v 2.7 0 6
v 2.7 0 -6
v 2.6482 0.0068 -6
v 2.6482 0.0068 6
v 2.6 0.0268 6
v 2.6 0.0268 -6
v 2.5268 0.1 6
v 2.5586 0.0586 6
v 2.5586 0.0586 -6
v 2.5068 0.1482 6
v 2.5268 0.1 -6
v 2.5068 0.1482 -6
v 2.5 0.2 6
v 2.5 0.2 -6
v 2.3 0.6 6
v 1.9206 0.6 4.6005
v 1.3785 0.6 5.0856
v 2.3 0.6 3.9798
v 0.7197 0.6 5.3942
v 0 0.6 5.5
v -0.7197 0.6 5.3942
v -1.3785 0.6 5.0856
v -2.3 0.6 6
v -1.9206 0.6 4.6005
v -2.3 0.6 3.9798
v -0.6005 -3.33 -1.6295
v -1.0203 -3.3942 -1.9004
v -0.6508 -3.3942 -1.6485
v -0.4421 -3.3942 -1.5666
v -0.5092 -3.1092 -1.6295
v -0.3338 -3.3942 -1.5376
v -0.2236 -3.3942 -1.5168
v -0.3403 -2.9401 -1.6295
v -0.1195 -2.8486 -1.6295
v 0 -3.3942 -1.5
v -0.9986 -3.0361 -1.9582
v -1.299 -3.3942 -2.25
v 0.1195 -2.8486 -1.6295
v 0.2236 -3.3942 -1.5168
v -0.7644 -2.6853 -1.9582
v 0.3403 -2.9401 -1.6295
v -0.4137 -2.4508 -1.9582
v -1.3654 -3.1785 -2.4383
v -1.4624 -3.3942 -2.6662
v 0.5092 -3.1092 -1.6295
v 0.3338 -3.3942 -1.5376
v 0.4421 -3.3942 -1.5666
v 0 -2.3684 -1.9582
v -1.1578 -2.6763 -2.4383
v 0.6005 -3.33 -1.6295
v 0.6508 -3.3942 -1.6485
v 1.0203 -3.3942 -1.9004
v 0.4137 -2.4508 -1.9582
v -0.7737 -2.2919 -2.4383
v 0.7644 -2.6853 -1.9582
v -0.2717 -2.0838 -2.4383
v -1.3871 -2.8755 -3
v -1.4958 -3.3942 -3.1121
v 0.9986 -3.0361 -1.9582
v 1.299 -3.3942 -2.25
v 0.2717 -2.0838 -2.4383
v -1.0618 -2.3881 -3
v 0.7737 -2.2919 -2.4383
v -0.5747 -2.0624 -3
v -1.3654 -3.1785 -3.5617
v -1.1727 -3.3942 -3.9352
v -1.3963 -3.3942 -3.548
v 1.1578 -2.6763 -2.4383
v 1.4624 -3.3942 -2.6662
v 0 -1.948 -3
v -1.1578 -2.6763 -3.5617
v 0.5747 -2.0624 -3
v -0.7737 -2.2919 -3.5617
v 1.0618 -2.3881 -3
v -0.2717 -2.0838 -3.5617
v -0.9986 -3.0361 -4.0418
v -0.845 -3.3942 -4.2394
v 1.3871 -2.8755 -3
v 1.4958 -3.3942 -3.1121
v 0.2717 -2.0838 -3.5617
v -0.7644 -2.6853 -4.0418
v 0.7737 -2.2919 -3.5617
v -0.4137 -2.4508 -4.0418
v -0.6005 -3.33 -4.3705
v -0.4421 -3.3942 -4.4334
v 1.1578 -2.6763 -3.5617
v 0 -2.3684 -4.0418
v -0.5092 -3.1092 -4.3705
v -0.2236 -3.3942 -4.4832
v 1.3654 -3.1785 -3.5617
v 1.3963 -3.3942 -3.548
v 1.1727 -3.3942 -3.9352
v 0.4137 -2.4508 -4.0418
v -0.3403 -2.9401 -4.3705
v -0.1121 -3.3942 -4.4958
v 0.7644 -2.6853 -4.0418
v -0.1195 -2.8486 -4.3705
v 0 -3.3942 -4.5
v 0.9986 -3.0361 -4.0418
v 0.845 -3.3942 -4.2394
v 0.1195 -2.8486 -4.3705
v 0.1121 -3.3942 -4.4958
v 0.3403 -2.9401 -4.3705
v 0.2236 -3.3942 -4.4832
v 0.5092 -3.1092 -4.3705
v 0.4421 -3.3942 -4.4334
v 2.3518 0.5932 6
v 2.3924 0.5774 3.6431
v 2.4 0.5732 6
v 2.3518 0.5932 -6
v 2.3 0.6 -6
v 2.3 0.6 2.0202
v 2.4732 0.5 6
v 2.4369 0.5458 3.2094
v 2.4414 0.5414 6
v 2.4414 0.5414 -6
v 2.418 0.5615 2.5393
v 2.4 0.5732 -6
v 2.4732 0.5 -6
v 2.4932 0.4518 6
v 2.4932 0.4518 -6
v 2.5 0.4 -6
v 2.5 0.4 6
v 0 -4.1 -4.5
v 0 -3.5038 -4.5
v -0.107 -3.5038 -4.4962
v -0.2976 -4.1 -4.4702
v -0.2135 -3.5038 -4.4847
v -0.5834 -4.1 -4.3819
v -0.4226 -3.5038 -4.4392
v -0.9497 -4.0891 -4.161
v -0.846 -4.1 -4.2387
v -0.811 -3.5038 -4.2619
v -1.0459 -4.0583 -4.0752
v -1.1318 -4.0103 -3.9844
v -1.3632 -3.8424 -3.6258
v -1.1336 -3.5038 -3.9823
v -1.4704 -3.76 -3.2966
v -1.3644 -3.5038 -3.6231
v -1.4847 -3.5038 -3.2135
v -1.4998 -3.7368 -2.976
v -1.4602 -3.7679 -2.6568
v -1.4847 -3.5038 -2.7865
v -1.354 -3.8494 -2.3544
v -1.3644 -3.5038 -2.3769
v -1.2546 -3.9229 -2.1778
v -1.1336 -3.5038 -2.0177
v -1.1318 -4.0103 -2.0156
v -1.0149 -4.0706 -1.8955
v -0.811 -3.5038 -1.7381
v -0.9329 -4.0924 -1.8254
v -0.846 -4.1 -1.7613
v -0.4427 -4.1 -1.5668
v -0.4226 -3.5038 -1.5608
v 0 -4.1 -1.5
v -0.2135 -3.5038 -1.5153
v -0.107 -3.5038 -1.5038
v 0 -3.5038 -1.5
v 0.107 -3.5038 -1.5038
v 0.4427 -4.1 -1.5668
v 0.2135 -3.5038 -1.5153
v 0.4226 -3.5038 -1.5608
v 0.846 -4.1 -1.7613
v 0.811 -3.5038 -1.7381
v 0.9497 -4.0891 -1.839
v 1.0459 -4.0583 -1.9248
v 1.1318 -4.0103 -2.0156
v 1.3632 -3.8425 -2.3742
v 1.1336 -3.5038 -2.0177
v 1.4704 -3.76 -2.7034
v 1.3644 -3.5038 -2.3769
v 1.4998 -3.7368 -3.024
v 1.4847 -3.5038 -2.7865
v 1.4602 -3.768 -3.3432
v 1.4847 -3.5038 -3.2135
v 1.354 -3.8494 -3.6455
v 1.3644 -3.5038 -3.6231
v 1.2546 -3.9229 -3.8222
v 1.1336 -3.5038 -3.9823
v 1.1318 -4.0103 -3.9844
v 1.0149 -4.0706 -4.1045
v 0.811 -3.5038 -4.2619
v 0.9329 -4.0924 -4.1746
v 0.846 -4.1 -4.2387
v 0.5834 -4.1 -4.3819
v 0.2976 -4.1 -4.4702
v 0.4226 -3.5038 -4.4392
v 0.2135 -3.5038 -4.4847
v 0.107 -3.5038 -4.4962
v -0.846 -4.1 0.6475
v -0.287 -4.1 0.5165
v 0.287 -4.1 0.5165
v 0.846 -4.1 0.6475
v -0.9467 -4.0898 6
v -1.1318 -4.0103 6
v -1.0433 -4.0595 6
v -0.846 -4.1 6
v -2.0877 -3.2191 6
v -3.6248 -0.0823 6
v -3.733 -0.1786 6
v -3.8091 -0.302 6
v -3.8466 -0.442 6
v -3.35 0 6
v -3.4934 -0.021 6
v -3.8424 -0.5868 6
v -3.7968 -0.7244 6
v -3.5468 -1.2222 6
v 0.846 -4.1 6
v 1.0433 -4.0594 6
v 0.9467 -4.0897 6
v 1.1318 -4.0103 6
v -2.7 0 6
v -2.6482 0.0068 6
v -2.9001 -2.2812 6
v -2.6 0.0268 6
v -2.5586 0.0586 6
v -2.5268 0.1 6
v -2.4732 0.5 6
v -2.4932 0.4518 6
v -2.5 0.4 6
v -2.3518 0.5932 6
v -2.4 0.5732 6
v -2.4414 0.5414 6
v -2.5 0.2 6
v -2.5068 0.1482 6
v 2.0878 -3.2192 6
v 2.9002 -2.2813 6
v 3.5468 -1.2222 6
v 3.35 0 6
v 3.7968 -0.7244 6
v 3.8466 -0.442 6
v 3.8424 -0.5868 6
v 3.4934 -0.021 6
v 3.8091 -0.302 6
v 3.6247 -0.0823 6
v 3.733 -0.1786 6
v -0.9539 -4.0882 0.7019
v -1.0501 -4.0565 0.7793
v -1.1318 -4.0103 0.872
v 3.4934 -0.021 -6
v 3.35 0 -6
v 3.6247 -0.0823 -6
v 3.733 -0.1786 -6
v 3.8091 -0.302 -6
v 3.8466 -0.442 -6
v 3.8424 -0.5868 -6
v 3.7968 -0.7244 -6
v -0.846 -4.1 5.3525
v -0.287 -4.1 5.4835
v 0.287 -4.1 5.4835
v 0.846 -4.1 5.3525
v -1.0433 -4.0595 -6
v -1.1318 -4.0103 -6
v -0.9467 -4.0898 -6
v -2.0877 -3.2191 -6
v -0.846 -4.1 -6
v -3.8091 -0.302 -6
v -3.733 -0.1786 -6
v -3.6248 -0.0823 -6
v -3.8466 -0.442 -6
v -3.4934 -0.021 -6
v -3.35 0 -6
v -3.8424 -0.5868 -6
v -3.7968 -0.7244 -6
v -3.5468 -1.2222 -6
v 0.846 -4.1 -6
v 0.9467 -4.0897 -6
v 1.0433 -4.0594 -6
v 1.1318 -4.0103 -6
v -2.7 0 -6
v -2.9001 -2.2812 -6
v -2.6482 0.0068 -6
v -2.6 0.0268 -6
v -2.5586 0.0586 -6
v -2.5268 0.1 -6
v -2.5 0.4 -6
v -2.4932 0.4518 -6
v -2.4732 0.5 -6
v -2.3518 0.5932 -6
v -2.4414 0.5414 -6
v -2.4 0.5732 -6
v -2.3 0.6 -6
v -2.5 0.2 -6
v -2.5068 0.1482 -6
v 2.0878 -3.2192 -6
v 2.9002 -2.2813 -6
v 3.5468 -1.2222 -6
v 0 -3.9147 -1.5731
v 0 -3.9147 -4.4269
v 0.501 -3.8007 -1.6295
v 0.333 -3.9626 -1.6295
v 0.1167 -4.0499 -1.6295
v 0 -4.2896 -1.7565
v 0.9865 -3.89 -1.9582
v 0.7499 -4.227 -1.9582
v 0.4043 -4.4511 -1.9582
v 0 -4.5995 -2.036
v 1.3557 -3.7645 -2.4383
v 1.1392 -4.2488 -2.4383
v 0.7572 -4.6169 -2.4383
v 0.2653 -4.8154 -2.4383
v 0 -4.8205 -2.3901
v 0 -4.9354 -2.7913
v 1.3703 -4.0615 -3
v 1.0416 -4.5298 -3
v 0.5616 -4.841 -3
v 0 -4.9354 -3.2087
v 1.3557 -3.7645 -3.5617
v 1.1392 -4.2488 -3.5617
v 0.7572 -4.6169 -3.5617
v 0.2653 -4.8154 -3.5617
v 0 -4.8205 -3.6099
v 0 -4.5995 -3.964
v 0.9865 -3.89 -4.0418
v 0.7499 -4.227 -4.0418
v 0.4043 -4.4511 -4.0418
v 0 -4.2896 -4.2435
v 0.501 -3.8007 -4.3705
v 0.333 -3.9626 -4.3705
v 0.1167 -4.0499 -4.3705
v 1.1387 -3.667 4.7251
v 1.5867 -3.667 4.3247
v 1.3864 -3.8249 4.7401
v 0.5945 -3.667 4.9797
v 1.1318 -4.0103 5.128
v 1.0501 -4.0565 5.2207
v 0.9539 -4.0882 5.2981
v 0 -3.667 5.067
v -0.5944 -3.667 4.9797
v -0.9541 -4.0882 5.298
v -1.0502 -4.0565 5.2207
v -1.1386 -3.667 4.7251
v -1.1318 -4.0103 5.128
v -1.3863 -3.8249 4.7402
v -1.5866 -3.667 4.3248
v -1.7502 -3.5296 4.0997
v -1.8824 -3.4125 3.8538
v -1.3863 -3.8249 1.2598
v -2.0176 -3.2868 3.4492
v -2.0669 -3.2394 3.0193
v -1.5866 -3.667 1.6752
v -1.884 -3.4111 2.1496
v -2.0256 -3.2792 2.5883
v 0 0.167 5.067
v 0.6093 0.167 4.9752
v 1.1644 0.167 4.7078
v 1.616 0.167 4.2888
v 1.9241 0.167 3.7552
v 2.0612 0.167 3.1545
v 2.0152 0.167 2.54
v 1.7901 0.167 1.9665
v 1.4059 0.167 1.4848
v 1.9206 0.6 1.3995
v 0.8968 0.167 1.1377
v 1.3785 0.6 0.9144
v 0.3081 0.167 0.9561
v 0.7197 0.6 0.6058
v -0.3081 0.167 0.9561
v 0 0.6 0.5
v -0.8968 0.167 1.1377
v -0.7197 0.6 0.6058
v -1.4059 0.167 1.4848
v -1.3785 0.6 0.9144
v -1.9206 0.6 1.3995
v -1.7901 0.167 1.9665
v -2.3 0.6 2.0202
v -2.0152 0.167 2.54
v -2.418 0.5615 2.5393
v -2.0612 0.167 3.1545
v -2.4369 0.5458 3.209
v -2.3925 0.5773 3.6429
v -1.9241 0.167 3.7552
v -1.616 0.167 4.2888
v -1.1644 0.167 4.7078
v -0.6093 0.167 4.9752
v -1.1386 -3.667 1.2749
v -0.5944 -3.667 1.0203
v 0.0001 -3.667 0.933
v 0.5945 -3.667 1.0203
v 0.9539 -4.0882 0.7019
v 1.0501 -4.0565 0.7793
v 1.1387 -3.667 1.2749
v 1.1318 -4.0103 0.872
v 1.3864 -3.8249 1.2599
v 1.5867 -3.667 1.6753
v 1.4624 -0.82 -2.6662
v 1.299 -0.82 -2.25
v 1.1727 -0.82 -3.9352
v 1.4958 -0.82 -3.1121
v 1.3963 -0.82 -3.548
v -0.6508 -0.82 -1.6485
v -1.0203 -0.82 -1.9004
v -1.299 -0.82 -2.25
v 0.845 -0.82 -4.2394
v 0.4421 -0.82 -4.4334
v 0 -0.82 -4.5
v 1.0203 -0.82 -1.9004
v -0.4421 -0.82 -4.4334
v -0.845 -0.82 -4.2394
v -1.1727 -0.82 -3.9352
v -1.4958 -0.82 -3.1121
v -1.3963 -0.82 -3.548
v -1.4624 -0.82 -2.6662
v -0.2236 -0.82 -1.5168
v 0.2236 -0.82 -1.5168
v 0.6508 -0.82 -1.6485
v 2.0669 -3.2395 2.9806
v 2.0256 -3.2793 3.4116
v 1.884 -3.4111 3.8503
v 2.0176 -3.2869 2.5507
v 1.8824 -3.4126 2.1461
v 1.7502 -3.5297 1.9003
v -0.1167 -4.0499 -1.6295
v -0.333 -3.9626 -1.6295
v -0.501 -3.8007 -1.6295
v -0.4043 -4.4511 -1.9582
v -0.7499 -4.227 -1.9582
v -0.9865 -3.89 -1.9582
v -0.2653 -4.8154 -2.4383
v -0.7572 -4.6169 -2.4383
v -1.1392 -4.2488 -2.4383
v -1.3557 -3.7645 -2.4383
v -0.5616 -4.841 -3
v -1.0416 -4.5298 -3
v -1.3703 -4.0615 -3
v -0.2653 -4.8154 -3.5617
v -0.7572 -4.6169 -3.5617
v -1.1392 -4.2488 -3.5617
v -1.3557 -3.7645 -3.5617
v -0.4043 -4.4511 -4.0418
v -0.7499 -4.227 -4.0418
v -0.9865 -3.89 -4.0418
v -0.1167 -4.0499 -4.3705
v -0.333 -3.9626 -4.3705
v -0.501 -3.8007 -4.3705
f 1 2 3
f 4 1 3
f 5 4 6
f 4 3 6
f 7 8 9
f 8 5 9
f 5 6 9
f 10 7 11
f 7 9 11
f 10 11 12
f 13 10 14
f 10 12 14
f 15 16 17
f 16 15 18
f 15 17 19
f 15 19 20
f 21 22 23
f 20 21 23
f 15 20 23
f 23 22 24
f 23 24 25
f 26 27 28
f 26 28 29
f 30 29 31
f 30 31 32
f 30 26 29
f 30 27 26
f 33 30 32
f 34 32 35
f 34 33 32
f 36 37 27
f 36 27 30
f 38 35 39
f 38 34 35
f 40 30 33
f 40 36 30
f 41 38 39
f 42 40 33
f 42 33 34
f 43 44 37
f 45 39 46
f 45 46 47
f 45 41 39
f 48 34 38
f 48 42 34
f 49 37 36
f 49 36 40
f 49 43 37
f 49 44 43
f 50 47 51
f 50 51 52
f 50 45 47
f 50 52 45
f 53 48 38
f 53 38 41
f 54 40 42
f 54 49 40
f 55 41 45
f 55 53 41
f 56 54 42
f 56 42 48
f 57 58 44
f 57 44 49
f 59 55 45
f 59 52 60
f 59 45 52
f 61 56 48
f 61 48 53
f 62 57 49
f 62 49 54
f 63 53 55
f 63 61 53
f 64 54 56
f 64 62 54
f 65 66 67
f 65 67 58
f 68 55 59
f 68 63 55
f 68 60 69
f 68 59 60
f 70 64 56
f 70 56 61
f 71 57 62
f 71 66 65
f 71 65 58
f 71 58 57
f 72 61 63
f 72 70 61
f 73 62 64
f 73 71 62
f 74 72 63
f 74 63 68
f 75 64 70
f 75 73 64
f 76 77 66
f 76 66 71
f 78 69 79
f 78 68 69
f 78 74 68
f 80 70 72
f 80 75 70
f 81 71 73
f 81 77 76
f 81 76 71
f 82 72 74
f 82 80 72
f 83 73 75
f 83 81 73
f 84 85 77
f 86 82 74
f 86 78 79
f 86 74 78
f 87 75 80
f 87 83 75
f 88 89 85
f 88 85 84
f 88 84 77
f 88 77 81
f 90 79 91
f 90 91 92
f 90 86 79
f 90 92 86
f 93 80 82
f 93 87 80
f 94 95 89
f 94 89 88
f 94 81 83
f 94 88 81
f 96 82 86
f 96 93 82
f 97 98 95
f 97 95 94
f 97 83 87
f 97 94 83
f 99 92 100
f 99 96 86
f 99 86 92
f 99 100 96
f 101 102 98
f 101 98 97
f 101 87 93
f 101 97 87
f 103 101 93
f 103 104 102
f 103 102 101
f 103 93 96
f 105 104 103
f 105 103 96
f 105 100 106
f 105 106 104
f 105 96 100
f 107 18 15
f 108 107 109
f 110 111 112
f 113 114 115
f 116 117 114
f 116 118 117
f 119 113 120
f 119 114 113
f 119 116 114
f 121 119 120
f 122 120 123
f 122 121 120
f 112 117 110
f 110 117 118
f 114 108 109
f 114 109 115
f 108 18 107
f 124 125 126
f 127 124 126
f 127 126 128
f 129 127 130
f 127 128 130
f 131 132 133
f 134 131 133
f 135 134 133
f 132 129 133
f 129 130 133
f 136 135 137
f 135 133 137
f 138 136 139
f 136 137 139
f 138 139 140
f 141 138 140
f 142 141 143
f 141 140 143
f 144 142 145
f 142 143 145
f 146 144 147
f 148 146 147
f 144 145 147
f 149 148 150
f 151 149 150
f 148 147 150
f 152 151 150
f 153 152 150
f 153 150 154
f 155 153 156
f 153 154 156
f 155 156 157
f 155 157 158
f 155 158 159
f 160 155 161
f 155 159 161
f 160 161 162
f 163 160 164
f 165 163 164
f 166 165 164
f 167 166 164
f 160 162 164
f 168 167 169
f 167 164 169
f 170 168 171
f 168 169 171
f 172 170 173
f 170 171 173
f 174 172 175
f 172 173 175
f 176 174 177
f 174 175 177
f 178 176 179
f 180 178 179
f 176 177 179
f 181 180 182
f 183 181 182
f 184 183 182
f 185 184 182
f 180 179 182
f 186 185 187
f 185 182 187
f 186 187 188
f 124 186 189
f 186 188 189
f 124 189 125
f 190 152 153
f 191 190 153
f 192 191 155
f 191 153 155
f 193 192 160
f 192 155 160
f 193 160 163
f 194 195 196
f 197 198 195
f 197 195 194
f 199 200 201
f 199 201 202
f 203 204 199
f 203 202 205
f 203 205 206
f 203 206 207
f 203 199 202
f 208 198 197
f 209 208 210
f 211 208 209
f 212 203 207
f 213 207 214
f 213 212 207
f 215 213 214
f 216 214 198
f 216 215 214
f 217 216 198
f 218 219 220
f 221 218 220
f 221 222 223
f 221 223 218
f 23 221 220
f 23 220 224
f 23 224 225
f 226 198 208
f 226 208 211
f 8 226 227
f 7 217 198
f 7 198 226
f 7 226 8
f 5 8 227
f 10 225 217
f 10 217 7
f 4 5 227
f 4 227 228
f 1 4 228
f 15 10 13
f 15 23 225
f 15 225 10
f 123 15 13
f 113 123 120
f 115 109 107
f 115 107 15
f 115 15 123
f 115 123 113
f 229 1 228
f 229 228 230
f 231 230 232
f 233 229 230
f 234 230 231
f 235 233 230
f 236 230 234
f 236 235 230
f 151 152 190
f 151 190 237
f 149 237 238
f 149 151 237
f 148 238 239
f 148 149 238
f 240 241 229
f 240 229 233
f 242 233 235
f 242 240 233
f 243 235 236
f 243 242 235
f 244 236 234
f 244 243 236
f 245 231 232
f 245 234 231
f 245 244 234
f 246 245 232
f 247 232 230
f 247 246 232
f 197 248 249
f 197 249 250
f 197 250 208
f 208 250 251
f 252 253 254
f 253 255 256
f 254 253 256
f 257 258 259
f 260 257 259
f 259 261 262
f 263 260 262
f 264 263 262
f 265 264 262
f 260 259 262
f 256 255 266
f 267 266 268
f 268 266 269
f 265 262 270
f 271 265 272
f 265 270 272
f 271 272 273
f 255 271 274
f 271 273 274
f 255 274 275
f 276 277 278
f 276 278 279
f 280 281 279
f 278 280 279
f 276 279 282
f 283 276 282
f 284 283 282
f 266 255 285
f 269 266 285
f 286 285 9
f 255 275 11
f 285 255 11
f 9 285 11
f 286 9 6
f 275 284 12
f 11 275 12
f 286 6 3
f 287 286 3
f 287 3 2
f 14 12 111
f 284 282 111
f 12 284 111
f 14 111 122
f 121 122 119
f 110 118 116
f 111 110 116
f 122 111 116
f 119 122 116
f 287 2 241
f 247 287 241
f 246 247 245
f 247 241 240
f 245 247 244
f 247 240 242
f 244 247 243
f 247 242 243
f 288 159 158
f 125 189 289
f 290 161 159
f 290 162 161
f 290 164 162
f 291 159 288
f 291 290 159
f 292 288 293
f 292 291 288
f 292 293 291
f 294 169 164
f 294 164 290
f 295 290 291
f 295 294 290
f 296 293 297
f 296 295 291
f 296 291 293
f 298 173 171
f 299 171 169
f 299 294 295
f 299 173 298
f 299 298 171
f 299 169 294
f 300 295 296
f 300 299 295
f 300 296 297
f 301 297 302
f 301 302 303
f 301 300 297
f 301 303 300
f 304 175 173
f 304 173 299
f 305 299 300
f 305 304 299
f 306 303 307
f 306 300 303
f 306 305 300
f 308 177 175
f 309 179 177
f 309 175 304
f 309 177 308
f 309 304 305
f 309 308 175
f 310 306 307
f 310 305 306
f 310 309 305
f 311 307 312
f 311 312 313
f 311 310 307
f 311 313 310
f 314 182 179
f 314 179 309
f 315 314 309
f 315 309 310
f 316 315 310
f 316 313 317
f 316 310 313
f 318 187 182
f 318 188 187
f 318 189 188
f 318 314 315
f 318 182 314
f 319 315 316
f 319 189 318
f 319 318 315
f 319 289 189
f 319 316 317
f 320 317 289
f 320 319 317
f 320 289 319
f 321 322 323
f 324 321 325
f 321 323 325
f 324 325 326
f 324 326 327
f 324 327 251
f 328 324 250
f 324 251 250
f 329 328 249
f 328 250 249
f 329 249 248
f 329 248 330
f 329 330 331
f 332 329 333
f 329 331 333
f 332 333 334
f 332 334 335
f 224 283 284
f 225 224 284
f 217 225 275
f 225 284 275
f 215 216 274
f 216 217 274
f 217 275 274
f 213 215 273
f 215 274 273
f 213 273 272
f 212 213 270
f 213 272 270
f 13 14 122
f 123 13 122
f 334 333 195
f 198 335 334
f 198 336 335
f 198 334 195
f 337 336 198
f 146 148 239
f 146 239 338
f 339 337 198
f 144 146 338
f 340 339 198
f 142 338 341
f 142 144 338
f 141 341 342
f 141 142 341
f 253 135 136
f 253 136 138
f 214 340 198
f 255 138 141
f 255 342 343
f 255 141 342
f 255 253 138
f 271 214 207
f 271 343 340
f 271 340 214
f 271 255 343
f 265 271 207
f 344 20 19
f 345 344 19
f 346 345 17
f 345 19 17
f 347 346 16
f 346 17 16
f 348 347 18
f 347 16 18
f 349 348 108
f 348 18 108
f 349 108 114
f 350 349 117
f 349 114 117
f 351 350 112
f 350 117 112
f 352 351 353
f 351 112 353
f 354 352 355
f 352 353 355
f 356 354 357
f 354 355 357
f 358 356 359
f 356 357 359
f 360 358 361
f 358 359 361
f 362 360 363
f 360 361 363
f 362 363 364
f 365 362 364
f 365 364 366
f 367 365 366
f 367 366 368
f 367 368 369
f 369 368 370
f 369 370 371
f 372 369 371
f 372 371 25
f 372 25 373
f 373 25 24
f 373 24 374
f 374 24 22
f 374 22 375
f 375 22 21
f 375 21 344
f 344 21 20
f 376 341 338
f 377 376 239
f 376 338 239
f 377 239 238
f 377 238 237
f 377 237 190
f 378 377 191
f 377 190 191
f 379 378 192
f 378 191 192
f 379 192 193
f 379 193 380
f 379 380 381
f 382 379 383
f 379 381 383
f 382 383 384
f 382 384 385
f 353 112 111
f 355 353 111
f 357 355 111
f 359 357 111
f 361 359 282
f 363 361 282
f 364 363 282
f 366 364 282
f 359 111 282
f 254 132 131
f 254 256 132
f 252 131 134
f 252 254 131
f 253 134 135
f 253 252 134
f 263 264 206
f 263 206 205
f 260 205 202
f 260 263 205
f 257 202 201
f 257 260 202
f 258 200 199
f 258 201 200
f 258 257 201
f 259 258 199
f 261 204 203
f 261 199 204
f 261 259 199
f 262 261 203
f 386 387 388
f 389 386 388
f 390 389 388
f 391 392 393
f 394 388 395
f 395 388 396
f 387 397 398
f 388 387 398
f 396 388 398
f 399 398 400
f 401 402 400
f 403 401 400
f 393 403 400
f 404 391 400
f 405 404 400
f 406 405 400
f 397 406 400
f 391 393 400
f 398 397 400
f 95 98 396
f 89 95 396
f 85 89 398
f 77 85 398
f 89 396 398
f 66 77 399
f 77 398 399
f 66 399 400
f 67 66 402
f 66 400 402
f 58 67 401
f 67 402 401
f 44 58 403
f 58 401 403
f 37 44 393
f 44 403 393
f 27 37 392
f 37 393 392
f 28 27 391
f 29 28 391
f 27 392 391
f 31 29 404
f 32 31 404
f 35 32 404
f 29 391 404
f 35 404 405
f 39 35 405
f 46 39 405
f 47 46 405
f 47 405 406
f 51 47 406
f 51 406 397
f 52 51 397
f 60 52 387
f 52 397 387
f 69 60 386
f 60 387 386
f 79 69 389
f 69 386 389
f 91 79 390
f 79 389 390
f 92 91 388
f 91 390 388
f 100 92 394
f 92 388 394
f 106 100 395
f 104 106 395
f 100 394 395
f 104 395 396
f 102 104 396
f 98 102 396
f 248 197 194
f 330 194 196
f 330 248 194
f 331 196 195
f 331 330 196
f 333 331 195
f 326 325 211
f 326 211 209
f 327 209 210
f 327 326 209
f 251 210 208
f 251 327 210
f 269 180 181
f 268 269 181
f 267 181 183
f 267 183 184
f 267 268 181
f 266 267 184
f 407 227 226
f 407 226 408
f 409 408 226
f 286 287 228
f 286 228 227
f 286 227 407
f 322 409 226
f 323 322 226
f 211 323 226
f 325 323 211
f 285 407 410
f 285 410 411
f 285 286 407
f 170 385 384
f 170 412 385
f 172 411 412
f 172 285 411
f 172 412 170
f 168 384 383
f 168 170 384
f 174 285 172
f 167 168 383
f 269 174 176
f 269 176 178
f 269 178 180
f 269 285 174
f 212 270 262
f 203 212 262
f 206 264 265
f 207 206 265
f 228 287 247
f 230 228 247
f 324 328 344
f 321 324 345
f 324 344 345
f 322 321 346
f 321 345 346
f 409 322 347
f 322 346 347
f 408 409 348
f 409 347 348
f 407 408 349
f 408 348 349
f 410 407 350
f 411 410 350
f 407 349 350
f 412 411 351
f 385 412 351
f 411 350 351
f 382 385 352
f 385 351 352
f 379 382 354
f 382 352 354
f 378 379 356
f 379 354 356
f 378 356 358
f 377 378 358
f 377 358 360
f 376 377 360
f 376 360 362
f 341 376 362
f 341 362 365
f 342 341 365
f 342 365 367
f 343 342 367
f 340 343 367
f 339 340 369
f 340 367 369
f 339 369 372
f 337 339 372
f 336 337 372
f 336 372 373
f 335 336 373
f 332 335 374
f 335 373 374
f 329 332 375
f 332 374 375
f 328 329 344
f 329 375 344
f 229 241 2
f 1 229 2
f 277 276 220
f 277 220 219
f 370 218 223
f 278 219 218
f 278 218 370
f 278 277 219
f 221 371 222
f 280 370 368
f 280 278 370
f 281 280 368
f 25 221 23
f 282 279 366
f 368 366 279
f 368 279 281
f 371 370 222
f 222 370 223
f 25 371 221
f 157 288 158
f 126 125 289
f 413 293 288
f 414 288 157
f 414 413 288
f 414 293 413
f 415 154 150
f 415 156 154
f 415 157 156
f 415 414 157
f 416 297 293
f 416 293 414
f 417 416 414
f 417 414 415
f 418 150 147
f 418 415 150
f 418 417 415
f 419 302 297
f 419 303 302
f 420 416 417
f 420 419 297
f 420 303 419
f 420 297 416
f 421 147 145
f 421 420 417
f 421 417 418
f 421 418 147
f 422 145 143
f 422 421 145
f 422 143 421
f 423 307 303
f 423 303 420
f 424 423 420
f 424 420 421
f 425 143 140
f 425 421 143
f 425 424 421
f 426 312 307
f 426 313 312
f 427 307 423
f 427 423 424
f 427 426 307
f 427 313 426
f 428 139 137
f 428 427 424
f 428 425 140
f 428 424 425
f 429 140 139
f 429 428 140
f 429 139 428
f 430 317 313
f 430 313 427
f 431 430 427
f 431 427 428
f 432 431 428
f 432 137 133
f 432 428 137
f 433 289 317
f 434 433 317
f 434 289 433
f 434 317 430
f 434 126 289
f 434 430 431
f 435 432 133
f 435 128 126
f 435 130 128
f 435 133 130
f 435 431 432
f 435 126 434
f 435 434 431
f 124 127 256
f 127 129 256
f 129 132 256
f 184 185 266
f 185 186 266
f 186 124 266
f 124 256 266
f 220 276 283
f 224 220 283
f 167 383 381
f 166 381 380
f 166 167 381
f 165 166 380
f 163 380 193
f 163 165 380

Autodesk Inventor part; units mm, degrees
sketch "Sketch_1" plane through (0, 0, 0) normal (0, 0, 1) x (1, 0, 0)
  arc A0 (-3.35, 0) -> (-3.7968, -0.7244) centre (-3.35, -0.5) ccw
  line L0 (-3.7968, -0.7244) -> (-3.5468, -1.2222)
  arc A1 (-3.5468, -1.2222) -> (-1.1318, -4.0103) centre (3.1555, 2.1435) ccw
  arc A2 (-1.1318, -4.0103) -> (-0.846, -4.1) centre (-0.846, -3.6) ccw
  line L1 (-0.846, -4.1) -> (0.846, -4.1)
  arc A3 (0.846, -4.1) -> (1.1318, -4.0103) centre (0.846, -3.6) ccw
  arc A4 (1.1318, -4.0103) -> (3.5468, -1.2222) centre (-3.1555, 2.1435) ccw
  line L2 (3.5468, -1.2222) -> (3.7968, -0.7244)
  arc A5 (3.7968, -0.7244) -> (3.35, 0) centre (3.35, -0.5) ccw
  line L3 (3.35, 0) -> (2.7, 0)
  arc A6 (2.5, 0.2) -> (2.7, 0) centre (2.7, 0.2) ccw
  line L4 (2.5, 0.2) -> (2.5, 0.4)
  arc A7 (2.5, 0.4) -> (2.3, 0.6) centre (2.3, 0.4) ccw
  line L5 (2.3, 0.6) -> (-2.3, 0.6)
  arc A8 (-2.3, 0.6) -> (-2.5, 0.4) centre (-2.3, 0.4) ccw
  line L6 (-2.5, 0.4) -> (-2.5, 0.2)
  arc A9 (-2.7, 0) -> (-2.5, 0.2) centre (-2.7, 0.2) ccw
  line L7 (-2.7, 0) -> (-3.35, 0)
extrude "Extrusion1" add sketch "Sketch_1" along normal mid plane 12
sketch "Sketch_2" plane through (0, 0, 0) normal (1, 0, 0) x (0, 1, 0)
  line L0 (0.6, 3) -> (-4.1, 3)
  line L1 (-4.1, 3) -> (-4.1, 5.5)
  line L2 (-4.1, 5.5) -> (-3.667, 5.067)
  line L3 (-3.667, 5.067) -> (0.167, 5.067)
  line L4 (0.167, 5.067) -> (0.6, 5.5)
  line L5 (0.6, 5.5) -> (0.6, 3)
  line L6 (0.6, 3) -> (-4.1, 3)
revolve "Revolution1" cut sketch "Sketch_2" angle 360 about axis through (0, 0.6, 3) along (0, 1, 0)
thread "Thread1" size "M5x0.8" class "6H" standard "ISO Metric profile" full length
sketch "Sketch3" plane through (-0.846, -4.1, -6) normal (0, -1, 0) x (1, 0, 0)
  point P0 (0.846, 3)
hole "Hole1" at (0, -4.1, -3) direction (0, 1, 0) diameter 3 depth 3.28
sketch "Sketch_5" plane through (0, 0, 0) normal (1, 0, 0) x (0, 1, 0)
  line L0 (-3.449, -1.499) -> (-3.449, -4.501)
  arc A0 (-3.449, -1.499) -> (-3.449, -4.501) centre (-3.449, -3) ccw
  line L1 (-3.449, -1.499) -> (-3.449, -4.501)
revolve "Revolution2" add sketch "Sketch_5" angle 360 about axis through (0, -3.449, -1.499) along (0, 0, 1)
ref_plane "nut_to_bolt_XY" through (0, 0, 3) normal (0, 1, 0) x (1, 0, 0)
ref_plane "nut_to_bolt_YZ" through (0, 0, 3) normal (1, 0, 0) x (0, 0, -1)
ref_plane "nut_to_bolt_ZX" through (0, 0, 3) normal (0, 0, -1) x (0, 1, 0)
properties part number "13084_m"
